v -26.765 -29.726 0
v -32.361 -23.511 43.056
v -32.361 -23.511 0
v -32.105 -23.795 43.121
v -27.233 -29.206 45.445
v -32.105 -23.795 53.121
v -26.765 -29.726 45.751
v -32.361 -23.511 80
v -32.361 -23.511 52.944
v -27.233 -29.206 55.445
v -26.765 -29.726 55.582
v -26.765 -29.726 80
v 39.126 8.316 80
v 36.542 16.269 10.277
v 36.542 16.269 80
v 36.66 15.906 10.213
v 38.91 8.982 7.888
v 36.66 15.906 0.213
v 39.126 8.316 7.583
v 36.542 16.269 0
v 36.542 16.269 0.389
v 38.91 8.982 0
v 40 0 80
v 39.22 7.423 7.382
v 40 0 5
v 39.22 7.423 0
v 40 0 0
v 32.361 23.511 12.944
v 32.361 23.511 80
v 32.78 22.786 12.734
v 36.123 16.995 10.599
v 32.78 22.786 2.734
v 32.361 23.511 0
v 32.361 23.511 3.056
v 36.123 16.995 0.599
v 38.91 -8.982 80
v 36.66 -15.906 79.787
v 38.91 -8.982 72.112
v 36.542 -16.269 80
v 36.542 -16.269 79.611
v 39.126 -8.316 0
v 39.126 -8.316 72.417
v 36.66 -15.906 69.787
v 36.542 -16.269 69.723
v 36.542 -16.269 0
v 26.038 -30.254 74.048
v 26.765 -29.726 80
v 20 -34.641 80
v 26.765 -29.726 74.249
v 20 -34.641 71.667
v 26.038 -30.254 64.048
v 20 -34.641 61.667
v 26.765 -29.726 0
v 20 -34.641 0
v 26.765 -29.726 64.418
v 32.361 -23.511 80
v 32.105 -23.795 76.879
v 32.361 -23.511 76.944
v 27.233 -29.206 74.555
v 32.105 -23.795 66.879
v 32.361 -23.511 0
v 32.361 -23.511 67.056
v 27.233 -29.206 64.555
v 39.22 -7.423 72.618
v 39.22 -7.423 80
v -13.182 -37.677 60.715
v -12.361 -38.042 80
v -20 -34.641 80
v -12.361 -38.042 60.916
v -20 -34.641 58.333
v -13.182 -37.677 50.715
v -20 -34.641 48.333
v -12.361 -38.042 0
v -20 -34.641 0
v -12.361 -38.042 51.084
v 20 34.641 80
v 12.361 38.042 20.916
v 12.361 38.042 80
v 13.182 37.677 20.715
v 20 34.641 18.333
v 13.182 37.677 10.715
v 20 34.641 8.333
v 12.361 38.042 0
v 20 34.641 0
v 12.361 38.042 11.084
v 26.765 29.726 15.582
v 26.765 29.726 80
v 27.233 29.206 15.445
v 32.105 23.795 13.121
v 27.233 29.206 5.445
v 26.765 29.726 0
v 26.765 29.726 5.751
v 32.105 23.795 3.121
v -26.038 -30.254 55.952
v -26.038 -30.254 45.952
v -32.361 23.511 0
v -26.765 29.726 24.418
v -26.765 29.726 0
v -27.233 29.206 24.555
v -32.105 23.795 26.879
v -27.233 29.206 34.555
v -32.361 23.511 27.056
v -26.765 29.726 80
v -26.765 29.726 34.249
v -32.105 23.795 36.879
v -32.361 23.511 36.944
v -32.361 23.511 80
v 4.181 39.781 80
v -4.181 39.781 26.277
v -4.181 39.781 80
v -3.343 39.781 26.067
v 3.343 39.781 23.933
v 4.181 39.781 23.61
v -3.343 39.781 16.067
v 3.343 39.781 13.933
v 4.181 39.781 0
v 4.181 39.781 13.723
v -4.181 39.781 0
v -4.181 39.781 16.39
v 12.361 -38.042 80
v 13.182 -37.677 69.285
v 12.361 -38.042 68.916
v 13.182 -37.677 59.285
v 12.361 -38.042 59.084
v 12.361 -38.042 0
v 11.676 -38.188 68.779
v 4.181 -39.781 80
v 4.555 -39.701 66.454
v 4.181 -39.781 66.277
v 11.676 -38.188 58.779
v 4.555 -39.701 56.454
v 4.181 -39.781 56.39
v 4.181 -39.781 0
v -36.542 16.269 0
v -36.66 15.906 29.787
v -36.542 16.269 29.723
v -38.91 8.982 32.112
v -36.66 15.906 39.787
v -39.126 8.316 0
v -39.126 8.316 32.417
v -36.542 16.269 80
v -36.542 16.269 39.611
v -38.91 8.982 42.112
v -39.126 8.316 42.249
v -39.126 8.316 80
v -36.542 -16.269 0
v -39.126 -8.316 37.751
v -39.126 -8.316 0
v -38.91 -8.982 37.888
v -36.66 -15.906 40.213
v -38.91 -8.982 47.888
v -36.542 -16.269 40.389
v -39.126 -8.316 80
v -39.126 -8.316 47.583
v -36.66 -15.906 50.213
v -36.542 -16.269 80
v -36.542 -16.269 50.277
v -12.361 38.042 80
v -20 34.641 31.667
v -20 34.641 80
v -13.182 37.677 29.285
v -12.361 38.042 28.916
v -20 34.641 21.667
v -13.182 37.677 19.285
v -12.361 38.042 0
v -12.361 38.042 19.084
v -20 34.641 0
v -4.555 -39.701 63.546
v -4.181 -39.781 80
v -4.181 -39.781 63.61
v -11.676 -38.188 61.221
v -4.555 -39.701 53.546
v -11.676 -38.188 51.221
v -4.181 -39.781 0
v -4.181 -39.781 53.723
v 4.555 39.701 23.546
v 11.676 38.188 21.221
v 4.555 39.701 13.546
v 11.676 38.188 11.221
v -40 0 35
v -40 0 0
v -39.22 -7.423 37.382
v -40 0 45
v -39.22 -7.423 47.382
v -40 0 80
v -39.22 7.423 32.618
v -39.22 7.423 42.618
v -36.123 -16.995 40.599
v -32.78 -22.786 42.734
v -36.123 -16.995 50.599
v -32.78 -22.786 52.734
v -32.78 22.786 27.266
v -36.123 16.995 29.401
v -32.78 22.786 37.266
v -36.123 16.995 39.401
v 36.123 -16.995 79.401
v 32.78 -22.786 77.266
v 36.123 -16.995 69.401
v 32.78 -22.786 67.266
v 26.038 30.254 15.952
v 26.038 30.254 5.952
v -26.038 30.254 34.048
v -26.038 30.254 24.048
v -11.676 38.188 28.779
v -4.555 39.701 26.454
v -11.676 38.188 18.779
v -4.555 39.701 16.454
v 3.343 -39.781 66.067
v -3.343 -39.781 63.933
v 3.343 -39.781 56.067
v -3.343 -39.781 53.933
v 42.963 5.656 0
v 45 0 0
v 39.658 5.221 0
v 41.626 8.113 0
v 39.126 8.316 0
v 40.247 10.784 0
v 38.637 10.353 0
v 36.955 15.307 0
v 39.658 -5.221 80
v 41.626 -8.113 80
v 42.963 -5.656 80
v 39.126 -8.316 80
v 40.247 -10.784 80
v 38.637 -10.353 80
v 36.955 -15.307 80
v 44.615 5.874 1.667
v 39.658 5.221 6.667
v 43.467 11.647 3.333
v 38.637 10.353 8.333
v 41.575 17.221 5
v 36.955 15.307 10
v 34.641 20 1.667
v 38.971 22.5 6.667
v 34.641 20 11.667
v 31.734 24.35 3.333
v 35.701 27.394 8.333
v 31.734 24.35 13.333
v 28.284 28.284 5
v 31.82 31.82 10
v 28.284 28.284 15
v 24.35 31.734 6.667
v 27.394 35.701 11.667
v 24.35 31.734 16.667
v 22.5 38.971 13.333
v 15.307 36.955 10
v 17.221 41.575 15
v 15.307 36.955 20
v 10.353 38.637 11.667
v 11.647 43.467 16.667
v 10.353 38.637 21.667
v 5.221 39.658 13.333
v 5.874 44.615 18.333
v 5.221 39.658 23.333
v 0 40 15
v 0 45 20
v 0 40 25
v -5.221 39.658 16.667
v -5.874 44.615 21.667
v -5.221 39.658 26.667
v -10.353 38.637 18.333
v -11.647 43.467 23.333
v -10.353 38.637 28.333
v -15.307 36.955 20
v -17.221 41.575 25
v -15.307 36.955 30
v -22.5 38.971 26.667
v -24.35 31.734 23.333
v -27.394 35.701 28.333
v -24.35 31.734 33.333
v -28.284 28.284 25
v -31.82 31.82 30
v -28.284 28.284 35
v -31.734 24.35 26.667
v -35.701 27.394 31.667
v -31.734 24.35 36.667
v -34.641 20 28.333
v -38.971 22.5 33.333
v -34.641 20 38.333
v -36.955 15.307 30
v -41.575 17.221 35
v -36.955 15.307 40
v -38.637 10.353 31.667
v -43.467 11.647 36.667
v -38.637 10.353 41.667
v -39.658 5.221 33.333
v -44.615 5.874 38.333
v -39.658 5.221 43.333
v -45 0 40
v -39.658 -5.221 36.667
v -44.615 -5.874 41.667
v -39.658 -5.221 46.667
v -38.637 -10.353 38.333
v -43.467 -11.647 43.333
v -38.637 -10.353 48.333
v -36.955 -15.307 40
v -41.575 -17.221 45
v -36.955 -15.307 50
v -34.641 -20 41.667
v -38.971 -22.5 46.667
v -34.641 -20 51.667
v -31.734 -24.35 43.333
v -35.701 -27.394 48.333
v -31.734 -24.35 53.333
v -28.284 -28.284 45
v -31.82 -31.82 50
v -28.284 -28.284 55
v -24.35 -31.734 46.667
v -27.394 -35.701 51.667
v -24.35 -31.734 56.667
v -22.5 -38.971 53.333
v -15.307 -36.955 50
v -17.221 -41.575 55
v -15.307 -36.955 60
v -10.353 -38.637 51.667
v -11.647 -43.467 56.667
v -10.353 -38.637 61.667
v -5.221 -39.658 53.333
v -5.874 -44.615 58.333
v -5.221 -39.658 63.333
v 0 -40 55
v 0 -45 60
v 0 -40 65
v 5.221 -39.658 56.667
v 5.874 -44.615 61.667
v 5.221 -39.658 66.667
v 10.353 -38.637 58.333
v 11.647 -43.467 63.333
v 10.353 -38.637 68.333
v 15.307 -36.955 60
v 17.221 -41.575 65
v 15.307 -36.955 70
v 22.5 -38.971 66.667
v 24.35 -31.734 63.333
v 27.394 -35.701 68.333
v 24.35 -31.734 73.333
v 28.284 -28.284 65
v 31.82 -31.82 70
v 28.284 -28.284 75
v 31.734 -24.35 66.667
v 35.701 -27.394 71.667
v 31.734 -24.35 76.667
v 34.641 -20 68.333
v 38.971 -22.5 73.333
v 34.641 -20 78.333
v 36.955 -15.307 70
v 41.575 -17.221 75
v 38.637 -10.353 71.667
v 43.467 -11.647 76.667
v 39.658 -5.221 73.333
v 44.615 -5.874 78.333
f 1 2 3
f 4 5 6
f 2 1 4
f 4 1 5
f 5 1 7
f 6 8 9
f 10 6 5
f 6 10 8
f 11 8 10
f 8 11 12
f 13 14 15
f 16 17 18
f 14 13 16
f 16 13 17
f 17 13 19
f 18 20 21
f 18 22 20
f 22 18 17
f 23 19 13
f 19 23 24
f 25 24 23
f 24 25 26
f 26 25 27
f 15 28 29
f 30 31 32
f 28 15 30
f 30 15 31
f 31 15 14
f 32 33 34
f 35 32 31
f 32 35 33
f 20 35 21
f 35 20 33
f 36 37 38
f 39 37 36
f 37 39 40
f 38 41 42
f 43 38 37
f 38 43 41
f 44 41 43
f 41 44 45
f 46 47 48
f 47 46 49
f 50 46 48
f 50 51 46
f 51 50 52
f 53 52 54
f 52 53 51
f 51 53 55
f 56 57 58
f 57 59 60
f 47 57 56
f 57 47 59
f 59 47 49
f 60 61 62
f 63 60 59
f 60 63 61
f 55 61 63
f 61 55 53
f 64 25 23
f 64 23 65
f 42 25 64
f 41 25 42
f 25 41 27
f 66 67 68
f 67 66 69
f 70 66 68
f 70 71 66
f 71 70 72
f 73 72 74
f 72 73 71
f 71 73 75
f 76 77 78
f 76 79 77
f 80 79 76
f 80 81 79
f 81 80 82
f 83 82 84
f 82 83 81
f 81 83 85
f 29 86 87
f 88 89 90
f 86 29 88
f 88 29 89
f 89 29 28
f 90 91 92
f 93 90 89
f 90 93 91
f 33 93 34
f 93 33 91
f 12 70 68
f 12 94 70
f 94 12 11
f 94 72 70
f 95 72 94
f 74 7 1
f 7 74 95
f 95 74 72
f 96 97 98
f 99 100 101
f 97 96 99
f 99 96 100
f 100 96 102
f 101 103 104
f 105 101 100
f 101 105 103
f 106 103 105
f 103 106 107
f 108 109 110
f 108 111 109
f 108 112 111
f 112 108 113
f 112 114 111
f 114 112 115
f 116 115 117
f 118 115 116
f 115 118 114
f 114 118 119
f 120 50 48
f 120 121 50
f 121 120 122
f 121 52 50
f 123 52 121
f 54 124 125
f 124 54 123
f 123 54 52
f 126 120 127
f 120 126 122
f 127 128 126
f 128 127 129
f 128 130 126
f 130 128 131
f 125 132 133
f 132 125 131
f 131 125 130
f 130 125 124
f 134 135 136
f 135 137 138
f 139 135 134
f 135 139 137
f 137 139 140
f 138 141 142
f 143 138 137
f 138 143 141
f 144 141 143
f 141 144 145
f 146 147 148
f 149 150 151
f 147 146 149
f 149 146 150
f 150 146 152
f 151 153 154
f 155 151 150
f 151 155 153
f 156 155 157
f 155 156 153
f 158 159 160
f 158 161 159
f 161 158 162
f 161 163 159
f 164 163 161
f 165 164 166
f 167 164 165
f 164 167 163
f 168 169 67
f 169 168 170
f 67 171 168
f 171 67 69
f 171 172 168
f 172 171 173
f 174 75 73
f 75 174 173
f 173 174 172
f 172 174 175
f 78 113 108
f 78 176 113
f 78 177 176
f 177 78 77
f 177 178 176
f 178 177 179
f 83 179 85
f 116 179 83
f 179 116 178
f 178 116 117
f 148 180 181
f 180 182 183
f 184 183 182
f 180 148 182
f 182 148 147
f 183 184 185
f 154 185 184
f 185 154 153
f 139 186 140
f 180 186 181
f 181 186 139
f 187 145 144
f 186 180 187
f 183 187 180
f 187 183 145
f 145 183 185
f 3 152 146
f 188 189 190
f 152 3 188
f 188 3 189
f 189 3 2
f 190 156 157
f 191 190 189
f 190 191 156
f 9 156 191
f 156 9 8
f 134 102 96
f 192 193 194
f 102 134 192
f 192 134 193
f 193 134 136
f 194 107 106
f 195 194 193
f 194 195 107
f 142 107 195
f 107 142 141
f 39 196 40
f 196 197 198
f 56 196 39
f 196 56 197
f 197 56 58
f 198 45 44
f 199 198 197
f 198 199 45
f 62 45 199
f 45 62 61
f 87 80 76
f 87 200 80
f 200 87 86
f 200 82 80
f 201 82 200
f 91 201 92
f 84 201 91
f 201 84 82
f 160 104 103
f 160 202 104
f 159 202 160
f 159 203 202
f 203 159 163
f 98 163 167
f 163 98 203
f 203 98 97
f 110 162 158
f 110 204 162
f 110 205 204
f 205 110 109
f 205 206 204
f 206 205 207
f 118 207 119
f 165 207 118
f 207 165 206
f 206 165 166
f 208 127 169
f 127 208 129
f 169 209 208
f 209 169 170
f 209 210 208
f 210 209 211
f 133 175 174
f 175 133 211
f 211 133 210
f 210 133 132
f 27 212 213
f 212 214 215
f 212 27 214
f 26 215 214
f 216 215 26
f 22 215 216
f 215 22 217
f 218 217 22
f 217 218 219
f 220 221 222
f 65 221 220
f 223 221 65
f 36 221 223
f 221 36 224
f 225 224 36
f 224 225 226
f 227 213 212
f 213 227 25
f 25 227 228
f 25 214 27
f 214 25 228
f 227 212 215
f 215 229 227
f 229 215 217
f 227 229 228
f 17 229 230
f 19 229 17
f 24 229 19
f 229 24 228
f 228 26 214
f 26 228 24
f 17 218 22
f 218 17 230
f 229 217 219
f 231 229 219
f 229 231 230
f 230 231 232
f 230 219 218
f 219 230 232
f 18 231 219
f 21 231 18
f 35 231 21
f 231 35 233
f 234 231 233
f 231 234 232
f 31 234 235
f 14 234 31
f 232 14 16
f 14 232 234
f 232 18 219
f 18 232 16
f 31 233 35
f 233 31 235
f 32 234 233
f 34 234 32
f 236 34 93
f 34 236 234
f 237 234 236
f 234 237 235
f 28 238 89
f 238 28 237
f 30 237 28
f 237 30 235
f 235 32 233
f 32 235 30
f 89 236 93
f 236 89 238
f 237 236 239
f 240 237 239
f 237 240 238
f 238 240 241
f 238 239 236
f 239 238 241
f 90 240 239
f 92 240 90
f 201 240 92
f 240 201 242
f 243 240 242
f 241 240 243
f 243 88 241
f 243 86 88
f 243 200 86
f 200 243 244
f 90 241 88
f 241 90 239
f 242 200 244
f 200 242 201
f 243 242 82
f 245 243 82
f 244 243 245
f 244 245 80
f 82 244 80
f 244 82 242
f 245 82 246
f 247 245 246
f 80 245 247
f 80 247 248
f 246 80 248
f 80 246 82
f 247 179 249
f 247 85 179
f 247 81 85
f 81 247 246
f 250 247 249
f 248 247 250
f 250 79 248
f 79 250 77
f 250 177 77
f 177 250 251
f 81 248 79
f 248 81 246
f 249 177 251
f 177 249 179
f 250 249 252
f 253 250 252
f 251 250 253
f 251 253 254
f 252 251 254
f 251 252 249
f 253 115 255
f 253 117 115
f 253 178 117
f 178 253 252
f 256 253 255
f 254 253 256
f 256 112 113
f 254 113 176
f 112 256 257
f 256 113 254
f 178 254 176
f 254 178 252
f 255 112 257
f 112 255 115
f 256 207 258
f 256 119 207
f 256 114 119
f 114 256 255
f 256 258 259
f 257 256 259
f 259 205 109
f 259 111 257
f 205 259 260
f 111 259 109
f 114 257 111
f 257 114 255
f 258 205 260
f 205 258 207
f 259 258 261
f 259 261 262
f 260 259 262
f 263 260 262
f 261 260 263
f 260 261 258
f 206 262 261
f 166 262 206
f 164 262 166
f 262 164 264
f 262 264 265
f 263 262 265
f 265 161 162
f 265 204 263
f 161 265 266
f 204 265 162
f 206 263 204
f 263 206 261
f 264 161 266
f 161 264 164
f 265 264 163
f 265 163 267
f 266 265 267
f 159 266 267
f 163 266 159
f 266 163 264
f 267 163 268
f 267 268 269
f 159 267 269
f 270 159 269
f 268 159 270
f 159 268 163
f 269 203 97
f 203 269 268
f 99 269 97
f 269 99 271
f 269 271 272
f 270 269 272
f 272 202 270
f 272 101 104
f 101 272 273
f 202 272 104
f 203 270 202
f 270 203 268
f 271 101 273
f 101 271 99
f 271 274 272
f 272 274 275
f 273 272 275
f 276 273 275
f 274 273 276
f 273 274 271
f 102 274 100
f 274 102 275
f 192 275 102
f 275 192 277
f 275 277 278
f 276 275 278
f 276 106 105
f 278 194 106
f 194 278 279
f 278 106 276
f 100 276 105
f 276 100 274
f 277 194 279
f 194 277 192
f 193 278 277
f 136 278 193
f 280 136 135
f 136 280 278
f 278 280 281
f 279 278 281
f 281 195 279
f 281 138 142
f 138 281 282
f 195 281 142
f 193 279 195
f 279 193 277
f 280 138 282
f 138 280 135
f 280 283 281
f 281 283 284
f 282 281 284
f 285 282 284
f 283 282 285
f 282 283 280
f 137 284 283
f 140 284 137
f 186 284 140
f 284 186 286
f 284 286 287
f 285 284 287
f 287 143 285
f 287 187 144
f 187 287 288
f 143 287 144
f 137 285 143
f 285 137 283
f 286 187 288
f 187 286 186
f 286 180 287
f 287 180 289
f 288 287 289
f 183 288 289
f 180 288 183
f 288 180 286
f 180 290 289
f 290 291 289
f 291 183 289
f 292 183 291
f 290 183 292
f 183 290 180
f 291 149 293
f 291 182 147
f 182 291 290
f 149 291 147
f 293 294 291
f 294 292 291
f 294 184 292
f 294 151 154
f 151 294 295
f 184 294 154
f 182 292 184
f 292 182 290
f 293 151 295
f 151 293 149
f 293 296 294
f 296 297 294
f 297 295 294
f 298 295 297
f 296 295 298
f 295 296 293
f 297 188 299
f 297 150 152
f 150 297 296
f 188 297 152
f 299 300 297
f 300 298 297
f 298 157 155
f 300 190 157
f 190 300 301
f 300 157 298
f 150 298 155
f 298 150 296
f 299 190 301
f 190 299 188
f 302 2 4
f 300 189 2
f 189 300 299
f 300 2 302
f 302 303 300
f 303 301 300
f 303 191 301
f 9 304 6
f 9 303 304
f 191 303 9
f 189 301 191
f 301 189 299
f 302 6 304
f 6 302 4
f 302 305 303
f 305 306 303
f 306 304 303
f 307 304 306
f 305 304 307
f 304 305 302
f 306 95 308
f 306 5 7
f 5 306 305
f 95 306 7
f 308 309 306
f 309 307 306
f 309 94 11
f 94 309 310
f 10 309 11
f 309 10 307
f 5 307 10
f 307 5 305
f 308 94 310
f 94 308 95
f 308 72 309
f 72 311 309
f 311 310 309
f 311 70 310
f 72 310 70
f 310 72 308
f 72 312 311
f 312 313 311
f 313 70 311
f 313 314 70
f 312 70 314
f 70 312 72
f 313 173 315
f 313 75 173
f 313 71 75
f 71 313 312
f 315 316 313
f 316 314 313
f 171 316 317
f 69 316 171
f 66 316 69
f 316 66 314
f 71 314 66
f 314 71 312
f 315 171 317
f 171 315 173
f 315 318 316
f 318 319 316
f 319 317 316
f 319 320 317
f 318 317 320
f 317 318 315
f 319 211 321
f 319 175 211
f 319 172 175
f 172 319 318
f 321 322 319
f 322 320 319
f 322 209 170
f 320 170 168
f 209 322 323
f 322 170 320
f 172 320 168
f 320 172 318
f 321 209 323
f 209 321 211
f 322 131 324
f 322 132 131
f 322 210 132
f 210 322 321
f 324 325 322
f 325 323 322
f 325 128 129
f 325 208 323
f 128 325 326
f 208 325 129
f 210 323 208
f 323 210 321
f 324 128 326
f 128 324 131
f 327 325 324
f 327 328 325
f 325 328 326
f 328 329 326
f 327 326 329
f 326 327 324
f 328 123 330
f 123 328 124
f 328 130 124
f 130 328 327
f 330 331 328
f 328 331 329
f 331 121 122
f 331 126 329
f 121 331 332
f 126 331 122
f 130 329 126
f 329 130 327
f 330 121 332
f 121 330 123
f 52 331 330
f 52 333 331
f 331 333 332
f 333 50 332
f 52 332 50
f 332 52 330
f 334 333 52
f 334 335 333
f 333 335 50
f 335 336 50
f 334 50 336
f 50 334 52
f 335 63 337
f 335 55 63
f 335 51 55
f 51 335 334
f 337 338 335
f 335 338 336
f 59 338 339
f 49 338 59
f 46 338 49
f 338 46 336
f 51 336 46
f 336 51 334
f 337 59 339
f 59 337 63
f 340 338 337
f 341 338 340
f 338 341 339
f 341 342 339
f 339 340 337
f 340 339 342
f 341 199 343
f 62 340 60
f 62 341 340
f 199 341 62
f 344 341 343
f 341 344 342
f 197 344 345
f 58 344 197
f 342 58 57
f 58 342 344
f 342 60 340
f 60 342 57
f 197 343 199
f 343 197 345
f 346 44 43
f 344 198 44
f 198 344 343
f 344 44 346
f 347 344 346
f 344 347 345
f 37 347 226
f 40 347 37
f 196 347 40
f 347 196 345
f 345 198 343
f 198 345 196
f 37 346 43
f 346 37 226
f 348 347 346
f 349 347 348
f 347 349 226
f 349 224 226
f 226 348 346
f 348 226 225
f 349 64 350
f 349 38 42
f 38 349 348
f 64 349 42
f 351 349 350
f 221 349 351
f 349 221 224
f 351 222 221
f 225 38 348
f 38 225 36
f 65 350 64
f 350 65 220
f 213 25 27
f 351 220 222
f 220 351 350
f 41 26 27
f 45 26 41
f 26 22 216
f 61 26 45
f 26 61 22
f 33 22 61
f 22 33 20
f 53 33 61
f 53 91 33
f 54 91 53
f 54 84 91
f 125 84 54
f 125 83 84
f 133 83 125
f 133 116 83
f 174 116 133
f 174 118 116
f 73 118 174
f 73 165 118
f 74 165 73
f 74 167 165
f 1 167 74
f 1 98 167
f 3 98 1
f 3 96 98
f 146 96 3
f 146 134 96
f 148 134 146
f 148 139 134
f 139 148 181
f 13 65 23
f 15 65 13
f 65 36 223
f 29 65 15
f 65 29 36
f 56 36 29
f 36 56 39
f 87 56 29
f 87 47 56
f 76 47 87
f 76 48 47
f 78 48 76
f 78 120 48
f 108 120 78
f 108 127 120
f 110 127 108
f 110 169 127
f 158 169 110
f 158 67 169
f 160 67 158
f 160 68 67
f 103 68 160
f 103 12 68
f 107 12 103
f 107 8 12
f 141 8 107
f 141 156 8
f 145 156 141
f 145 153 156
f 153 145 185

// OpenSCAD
union() {
	render() {
		difference() {
			polyhedron(points = [[40.0000000000, 0.0000000000, -5.0000000000], [45.0000000000, 0.0000000000, 0.0000000000], [40.0000000000, 0.0000000000, 5.0000000000], [39.6577944550, 5.2210476888, -3.3333333333], [44.6150187618, 5.8736786499, 1.6666666667], [39.6577944550, 5.2210476888, 6.6666666667], [38.6370330516, 10.3527618041, -1.6666666667], [43.4666621830, 11.6468570296, 3.3333333333], [38.6370330516, 10.3527618041, 8.3333333333], [36.9551813005, 15.3073372946, 0.0000000000], [41.5745789630, 17.2207544564, 5.0000000000], [36.9551813005, 15.3073372946, 10.0000000000], [34.6410161514, 20.0000000000, 1.6666666667], [38.9711431703, 22.5000000000, 6.6666666667], [34.6410161514, 20.0000000000, 11.6666666667], [31.7341336116, 24.3504571603, 3.3333333333], [35.7009003131, 27.3942643054, 8.3333333333], [31.7341336116, 24.3504571603, 13.3333333333], [28.2842712475, 28.2842712475, 5.0000000000], [31.8198051534, 31.8198051534, 10.0000000000], [28.2842712475, 28.2842712475, 15.0000000000], [24.3504571603, 31.7341336116, 6.6666666667], [27.3942643054, 35.7009003131, 11.6666666667], [24.3504571603, 31.7341336116, 16.6666666667], [20.0000000000, 34.6410161514, 8.3333333333], [22.5000000000, 38.9711431703, 13.3333333333], [20.0000000000, 34.6410161514, 18.3333333333], [15.3073372946, 36.9551813005, 10.0000000000], [17.2207544564, 41.5745789630, 15.0000000000], [15.3073372946, 36.9551813005, 20.0000000000], [10.3527618041, 38.6370330516, 11.6666666667], [11.6468570296, 43.4666621830, 16.6666666667], [10.3527618041, 38.6370330516, 21.6666666667], [5.2210476888, 39.6577944550, 13.3333333333], [5.8736786499, 44.6150187618, 18.3333333333], [5.2210476888, 39.6577944550, 23.3333333333], [0.0000000000, 40.0000000000, 15.0000000000], [0.0000000000, 45.0000000000, 20.0000000000], [0.0000000000, 40.0000000000, 25.0000000000], [-5.2210476888, 39.6577944550, 16.6666666667], [-5.8736786499, 44.6150187618, 21.6666666667], [-5.2210476888, 39.6577944550, 26.6666666667], [-10.3527618041, 38.6370330516, 18.3333333333], [-11.6468570296, 43.4666621830, 23.3333333333], [-10.3527618041, 38.6370330516, 28.3333333333], [-15.3073372946, 36.9551813005, 20.0000000000], [-17.2207544564, 41.5745789630, 25.0000000000], [-15.3073372946, 36.9551813005, 30.0000000000], [-20.0000000000, 34.6410161514, 21.6666666667], [-22.5000000000, 38.9711431703, 26.6666666667], [-20.0000000000, 34.6410161514, 31.6666666667], [-24.3504571603, 31.7341336116, 23.3333333333], [-27.3942643054, 35.7009003131, 28.3333333333], [-24.3504571603, 31.7341336116, 33.3333333333], [-28.2842712475, 28.2842712475, 25.0000000000], [-31.8198051534, 31.8198051534, 30.0000000000], [-28.2842712475, 28.2842712475, 35.0000000000], [-31.7341336116, 24.3504571603, 26.6666666667], [-35.7009003131, 27.3942643054, 31.6666666667], [-31.7341336116, 24.3504571603, 36.6666666667], [-34.6410161514, 20.0000000000, 28.3333333333], [-38.9711431703, 22.5000000000, 33.3333333333], [-34.6410161514, 20.0000000000, 38.3333333333], [-36.9551813005, 15.3073372946, 30.0000000000], [-41.5745789630, 17.2207544564, 35.0000000000], [-36.9551813005, 15.3073372946, 40.0000000000], [-38.6370330516, 10.3527618041, 31.6666666667], [-43.4666621830, 11.6468570296, 36.6666666667], [-38.6370330516, 10.3527618041, 41.6666666667], [-39.6577944550, 5.2210476888, 33.3333333333], [-44.6150187618, 5.8736786499, 38.3333333333], [-39.6577944550, 5.2210476888, 43.3333333333], [-40.0000000000, 0.0000000000, 35.0000000000], [-45.0000000000, 0.0000000000, 40.0000000000], [-40.0000000000, 0.0000000000, 45.0000000000], [-39.6577944550, -5.2210476888, 36.6666666667], [-44.6150187618, -5.8736786499, 41.6666666667], [-39.6577944550, -5.2210476888, 46.6666666667], [-38.6370330516, -10.3527618041, 38.3333333333], [-43.4666621830, -11.6468570296, 43.3333333333], [-38.6370330516, -10.3527618041, 48.3333333333], [-36.9551813005, -15.3073372946, 40.0000000000], [-41.5745789630, -17.2207544564, 45.0000000000], [-36.9551813005, -15.3073372946, 50.0000000000], [-34.6410161514, -20.0000000000, 41.6666666667], [-38.9711431703, -22.5000000000, 46.6666666667], [-34.6410161514, -20.0000000000, 51.6666666667], [-31.7341336116, -24.3504571603, 43.3333333333], [-35.7009003131, -27.3942643054, 48.3333333333], [-31.7341336116, -24.3504571603, 53.3333333333], [-28.2842712475, -28.2842712475, 45.0000000000], [-31.8198051534, -31.8198051534, 50.0000000000], [-28.2842712475, -28.2842712475, 55.0000000000], [-24.3504571603, -31.7341336116, 46.6666666667], [-27.3942643054, -35.7009003131, 51.6666666667], [-24.3504571603, -31.7341336116, 56.6666666667], [-20.0000000000, -34.6410161514, 48.3333333333], [-22.5000000000, -38.9711431703, 53.3333333333], [-20.0000000000, -34.6410161514, 58.3333333333], [-15.3073372946, -36.9551813005, 50.0000000000], [-17.2207544564, -41.5745789630, 55.0000000000], [-15.3073372946, -36.9551813005, 60.0000000000], [-10.3527618041, -38.6370330516, 51.6666666667], [-11.6468570296, -43.4666621830, 56.6666666667], [-10.3527618041, -38.6370330516, 61.6666666667], [-5.2210476888, -39.6577944550, 53.3333333333], [-5.8736786499, -44.6150187618, 58.3333333333], [-5.2210476888, -39.6577944550, 63.3333333333], [-0.0000000000, -40.0000000000, 55.0000000000], [-0.0000000000, -45.0000000000, 60.0000000000], [-0.0000000000, -40.0000000000, 65.0000000000], [5.2210476888, -39.6577944550, 56.6666666667], [5.8736786499, -44.6150187618, 61.6666666667], [5.2210476888, -39.6577944550, 66.6666666667], [10.3527618041, -38.6370330516, 58.3333333333], [11.6468570296, -43.4666621830, 63.3333333333], [10.3527618041, -38.6370330516, 68.3333333333], [15.3073372946, -36.9551813005, 60.0000000000], [17.2207544564, -41.5745789630, 65.0000000000], [15.3073372946, -36.9551813005, 70.0000000000], [20.0000000000, -34.6410161514, 61.6666666667], [22.5000000000, -38.9711431703, 66.6666666667], [20.0000000000, -34.6410161514, 71.6666666667], [24.3504571603, -31.7341336116, 63.3333333333], [27.3942643054, -35.7009003131, 68.3333333333], [24.3504571603, -31.7341336116, 73.3333333333], [28.2842712475, -28.2842712475, 65.0000000000], [31.8198051534, -31.8198051534, 70.0000000000], [28.2842712475, -28.2842712475, 75.0000000000], [31.7341336116, -24.3504571603, 66.6666666667], [35.7009003131, -27.3942643054, 71.6666666667], [31.7341336116, -24.3504571603, 76.6666666667], [34.6410161514, -20.0000000000, 68.3333333333], [38.9711431703, -22.5000000000, 73.3333333333], [34.6410161514, -20.0000000000, 78.3333333333], [36.9551813005, -15.3073372946, 70.0000000000], [41.5745789630, -17.2207544564, 75.0000000000], [36.9551813005, -15.3073372946, 80.0000000000], [38.6370330516, -10.3527618041, 71.6666666667], [43.4666621830, -11.6468570296, 76.6666666667], [38.6370330516, -10.3527618041, 81.6666666667], [39.6577944550, -5.2210476888, 73.3333333333], [44.6150187618, -5.8736786499, 78.3333333333], [39.6577944550, -5.2210476888, 83.3333333333]], triangles = [[0, 1, 3], [1, 4, 3], [1, 2, 4], [2, 5, 4], [0, 5, 2], [0, 3, 5], [3, 4, 6], [4, 7, 6], [4, 5, 7], [5, 8, 7], [3, 8, 5], [3, 6, 8], [6, 7, 9], [7, 10, 9], [7, 8, 10], [8, 11, 10], [6, 11, 8], [6, 9, 11], [9, 10, 12], [10, 13, 12], [10, 11, 13], [11, 14, 13], [9, 14, 11], [9, 12, 14], [12, 13, 15], [13, 16, 15], [13, 14, 16], [14, 17, 16], [12, 17, 14], [12, 15, 17], [15, 16, 18], [16, 19, 18], [16, 17, 19], [17, 20, 19], [15, 20, 17], [15, 18, 20], [18, 19, 21], [19, 22, 21], [19, 20, 22], [20, 23, 22], [18, 23, 20], [18, 21, 23], [21, 22, 24], [22, 25, 24], [22, 23, 25], [23, 26, 25], [21, 26, 23], [21, 24, 26], [24, 25, 27], [25, 28, 27], [25, 26, 28], [26, 29, 28], [24, 29, 26], [24, 27, 29], [27, 28, 30], [28, 31, 30], [28, 29, 31], [29, 32, 31], [27, 32, 29], [27, 30, 32], [30, 31, 33], [31, 34, 33], [31, 32, 34], [32, 35, 34], [30, 35, 32], [30, 33, 35], [33, 34, 36], [34, 37, 36], [34, 35, 37], [35, 38, 37], [33, 38, 35], [33, 36, 38], [36, 37, 39], [37, 40, 39], [37, 38, 40], [38, 41, 40], [36, 41, 38], [36, 39, 41], [39, 40, 42], [40, 43, 42], [40, 41, 43], [41, 44, 43], [39, 44, 41], [39, 42, 44], [42, 43, 45], [43, 46, 45], [43, 44, 46], [44, 47, 46], [42, 47, 44], [42, 45, 47], [45, 46, 48], [46, 49, 48], [46, 47, 49], [47, 50, 49], [45, 50, 47], [45, 48, 50], [48, 49, 51], [49, 52, 51], [49, 50, 52], [50, 53, 52], [48, 53, 50], [48, 51, 53], [51, 52, 54], [52, 55, 54], [52, 53, 55], [53, 56, 55], [51, 56, 53], [51, 54, 56], [54, 55, 57], [55, 58, 57], [55, 56, 58], [56, 59, 58], [54, 59, 56], [54, 57, 59], [57, 58, 60], [58, 61, 60], [58, 59, 61], [59, 62, 61], [57, 62, 59], [57, 60, 62], [60, 61, 63], [61, 64, 63], [61, 62, 64], [62, 65, 64], [60, 65, 62], [60, 63, 65], [63, 64, 66], [64, 67, 66], [64, 65, 67], [65, 68, 67], [63, 68, 65], [63, 66, 68], [66, 67, 69], [67, 70, 69], [67, 68, 70], [68, 71, 70], [66, 71, 68], [66, 69, 71], [69, 70, 72], [70, 73, 72], [70, 71, 73], [71, 74, 73], [69, 74, 71], [69, 72, 74], [72, 73, 75], [73, 76, 75], [73, 74, 76], [74, 77, 76], [72, 77, 74], [72, 75, 77], [75, 76, 78], [76, 79, 78], [76, 77, 79], [77, 80, 79], [75, 80, 77], [75, 78, 80], [78, 79, 81], [79, 82, 81], [79, 80, 82], [80, 83, 82], [78, 83, 80], [78, 81, 83], [81, 82, 84], [82, 85, 84], [82, 83, 85], [83, 86, 85], [81, 86, 83], [81, 84, 86], [84, 85, 87], [85, 88, 87], [85, 86, 88], [86, 89, 88], [84, 89, 86], [84, 87, 89], [87, 88, 90], [88, 91, 90], [88, 89, 91], [89, 92, 91], [87, 92, 89], [87, 90, 92], [90, 91, 93], [91, 94, 93], [91, 92, 94], [92, 95, 94], [90, 95, 92], [90, 93, 95], [93, 94, 96], [94, 97, 96], [94, 95, 97], [95, 98, 97], [93, 98, 95], [93, 96, 98], [96, 97, 99], [97, 100, 99], [97, 98, 100], [98, 101, 100], [96, 101, 98], [96, 99, 101], [99, 100, 102], [100, 103, 102], [100, 101, 103], [101, 104, 103], [99, 104, 101], [99, 102, 104], [102, 103, 105], [103, 106, 105], [103, 104, 106], [104, 107, 106], [102, 107, 104], [102, 105, 107], [105, 106, 108], [106, 109, 108], [106, 107, 109], [107, 110, 109], [105, 110, 107], [105, 108, 110], [108, 109, 111], [109, 112, 111], [109, 110, 112], [110, 113, 112], [108, 113, 110], [108, 111, 113], [111, 112, 114], [112, 115, 114], [112, 113, 115], [113, 116, 115], [111, 116, 113], [111, 114, 116], [114, 115, 117], [115, 118, 117], [115, 116, 118], [116, 119, 118], [114, 119, 116], [114, 117, 119], [117, 118, 120], [118, 121, 120], [118, 119, 121], [119, 122, 121], [117, 122, 119], [117, 120, 122], [120, 121, 123], [121, 124, 123], [121, 122, 124], [122, 125, 124], [120, 125, 122], [120, 123, 125], [123, 124, 126], [124, 127, 126], [124, 125, 127], [125, 128, 127], [123, 128, 125], [123, 126, 128], [126, 127, 129], [127, 130, 129], [127, 128, 130], [128, 131, 130], [126, 131, 128], [126, 129, 131], [129, 130, 132], [130, 133, 132], [130, 131, 133], [131, 134, 133], [129, 134, 131], [129, 132, 134], [132, 133, 135], [133, 136, 135], [133, 134, 136], [134, 137, 136], [132, 137, 134], [132, 135, 137], [135, 136, 138], [136, 139, 138], [136, 137, 139], [137, 140, 139], [135, 140, 137], [135, 138, 140], [138, 139, 141], [139, 142, 141], [139, 140, 142], [140, 143, 142], [138, 143, 140], [138, 141, 143], [0, 2, 1], [141, 142, 143]]);
			union() {
				translate(v = [0, 0, -5]) {
					cylinder(h = 90, r = 40);
				}
				translate(v = [0, 0, -45]) {
					cube(center = true, size = 90);
				}
				translate(v = [0, 0, 125]) {
					cube(center = true, size = 90);
				}
			}
		}
	}
	cylinder(h = 80, r = 40);
}
/***********************************************
******      SolidPython code:      *************
************************************************
 
#! /usr/bin/python
# -*- coding: UTF-8 -*-
from __future__ import division
import os, sys, re

from solid import *
from solid.utils import *
from solid import screw_thread 

SEGMENTS = 48

inner_rad = 40
screw_height=80
def assembly():
    section = screw_thread.default_thread_section( tooth_height=10, tooth_depth=5)  
    s = screw_thread.thread( outline_pts=section, inner_rad = inner_rad, 
                            pitch= screw_height, length=screw_height, segments_per_rot=SEGMENTS)
                            #, neck_in_degrees=90, neck_out_degrees=90)    
                        
    c = cylinder( r=inner_rad, h=screw_height )
    return s + c

if __name__ == '__main__':    
    out_dir = sys.argv[1] if len(sys.argv) > 1 else os.curdir
    file_out = os.path.join( out_dir, 'screw_thread_example.scad')
    
    a = assembly()
    
    bom = bill_of_materials()
    
    print "%(__file__)s: SCAD file written to: \n%(file_out)s \n"%vars()
    print bom
    
    scad_render_to_file( a, file_out, include_orig_code=True)
    
 
 
***********************************************/
                            
